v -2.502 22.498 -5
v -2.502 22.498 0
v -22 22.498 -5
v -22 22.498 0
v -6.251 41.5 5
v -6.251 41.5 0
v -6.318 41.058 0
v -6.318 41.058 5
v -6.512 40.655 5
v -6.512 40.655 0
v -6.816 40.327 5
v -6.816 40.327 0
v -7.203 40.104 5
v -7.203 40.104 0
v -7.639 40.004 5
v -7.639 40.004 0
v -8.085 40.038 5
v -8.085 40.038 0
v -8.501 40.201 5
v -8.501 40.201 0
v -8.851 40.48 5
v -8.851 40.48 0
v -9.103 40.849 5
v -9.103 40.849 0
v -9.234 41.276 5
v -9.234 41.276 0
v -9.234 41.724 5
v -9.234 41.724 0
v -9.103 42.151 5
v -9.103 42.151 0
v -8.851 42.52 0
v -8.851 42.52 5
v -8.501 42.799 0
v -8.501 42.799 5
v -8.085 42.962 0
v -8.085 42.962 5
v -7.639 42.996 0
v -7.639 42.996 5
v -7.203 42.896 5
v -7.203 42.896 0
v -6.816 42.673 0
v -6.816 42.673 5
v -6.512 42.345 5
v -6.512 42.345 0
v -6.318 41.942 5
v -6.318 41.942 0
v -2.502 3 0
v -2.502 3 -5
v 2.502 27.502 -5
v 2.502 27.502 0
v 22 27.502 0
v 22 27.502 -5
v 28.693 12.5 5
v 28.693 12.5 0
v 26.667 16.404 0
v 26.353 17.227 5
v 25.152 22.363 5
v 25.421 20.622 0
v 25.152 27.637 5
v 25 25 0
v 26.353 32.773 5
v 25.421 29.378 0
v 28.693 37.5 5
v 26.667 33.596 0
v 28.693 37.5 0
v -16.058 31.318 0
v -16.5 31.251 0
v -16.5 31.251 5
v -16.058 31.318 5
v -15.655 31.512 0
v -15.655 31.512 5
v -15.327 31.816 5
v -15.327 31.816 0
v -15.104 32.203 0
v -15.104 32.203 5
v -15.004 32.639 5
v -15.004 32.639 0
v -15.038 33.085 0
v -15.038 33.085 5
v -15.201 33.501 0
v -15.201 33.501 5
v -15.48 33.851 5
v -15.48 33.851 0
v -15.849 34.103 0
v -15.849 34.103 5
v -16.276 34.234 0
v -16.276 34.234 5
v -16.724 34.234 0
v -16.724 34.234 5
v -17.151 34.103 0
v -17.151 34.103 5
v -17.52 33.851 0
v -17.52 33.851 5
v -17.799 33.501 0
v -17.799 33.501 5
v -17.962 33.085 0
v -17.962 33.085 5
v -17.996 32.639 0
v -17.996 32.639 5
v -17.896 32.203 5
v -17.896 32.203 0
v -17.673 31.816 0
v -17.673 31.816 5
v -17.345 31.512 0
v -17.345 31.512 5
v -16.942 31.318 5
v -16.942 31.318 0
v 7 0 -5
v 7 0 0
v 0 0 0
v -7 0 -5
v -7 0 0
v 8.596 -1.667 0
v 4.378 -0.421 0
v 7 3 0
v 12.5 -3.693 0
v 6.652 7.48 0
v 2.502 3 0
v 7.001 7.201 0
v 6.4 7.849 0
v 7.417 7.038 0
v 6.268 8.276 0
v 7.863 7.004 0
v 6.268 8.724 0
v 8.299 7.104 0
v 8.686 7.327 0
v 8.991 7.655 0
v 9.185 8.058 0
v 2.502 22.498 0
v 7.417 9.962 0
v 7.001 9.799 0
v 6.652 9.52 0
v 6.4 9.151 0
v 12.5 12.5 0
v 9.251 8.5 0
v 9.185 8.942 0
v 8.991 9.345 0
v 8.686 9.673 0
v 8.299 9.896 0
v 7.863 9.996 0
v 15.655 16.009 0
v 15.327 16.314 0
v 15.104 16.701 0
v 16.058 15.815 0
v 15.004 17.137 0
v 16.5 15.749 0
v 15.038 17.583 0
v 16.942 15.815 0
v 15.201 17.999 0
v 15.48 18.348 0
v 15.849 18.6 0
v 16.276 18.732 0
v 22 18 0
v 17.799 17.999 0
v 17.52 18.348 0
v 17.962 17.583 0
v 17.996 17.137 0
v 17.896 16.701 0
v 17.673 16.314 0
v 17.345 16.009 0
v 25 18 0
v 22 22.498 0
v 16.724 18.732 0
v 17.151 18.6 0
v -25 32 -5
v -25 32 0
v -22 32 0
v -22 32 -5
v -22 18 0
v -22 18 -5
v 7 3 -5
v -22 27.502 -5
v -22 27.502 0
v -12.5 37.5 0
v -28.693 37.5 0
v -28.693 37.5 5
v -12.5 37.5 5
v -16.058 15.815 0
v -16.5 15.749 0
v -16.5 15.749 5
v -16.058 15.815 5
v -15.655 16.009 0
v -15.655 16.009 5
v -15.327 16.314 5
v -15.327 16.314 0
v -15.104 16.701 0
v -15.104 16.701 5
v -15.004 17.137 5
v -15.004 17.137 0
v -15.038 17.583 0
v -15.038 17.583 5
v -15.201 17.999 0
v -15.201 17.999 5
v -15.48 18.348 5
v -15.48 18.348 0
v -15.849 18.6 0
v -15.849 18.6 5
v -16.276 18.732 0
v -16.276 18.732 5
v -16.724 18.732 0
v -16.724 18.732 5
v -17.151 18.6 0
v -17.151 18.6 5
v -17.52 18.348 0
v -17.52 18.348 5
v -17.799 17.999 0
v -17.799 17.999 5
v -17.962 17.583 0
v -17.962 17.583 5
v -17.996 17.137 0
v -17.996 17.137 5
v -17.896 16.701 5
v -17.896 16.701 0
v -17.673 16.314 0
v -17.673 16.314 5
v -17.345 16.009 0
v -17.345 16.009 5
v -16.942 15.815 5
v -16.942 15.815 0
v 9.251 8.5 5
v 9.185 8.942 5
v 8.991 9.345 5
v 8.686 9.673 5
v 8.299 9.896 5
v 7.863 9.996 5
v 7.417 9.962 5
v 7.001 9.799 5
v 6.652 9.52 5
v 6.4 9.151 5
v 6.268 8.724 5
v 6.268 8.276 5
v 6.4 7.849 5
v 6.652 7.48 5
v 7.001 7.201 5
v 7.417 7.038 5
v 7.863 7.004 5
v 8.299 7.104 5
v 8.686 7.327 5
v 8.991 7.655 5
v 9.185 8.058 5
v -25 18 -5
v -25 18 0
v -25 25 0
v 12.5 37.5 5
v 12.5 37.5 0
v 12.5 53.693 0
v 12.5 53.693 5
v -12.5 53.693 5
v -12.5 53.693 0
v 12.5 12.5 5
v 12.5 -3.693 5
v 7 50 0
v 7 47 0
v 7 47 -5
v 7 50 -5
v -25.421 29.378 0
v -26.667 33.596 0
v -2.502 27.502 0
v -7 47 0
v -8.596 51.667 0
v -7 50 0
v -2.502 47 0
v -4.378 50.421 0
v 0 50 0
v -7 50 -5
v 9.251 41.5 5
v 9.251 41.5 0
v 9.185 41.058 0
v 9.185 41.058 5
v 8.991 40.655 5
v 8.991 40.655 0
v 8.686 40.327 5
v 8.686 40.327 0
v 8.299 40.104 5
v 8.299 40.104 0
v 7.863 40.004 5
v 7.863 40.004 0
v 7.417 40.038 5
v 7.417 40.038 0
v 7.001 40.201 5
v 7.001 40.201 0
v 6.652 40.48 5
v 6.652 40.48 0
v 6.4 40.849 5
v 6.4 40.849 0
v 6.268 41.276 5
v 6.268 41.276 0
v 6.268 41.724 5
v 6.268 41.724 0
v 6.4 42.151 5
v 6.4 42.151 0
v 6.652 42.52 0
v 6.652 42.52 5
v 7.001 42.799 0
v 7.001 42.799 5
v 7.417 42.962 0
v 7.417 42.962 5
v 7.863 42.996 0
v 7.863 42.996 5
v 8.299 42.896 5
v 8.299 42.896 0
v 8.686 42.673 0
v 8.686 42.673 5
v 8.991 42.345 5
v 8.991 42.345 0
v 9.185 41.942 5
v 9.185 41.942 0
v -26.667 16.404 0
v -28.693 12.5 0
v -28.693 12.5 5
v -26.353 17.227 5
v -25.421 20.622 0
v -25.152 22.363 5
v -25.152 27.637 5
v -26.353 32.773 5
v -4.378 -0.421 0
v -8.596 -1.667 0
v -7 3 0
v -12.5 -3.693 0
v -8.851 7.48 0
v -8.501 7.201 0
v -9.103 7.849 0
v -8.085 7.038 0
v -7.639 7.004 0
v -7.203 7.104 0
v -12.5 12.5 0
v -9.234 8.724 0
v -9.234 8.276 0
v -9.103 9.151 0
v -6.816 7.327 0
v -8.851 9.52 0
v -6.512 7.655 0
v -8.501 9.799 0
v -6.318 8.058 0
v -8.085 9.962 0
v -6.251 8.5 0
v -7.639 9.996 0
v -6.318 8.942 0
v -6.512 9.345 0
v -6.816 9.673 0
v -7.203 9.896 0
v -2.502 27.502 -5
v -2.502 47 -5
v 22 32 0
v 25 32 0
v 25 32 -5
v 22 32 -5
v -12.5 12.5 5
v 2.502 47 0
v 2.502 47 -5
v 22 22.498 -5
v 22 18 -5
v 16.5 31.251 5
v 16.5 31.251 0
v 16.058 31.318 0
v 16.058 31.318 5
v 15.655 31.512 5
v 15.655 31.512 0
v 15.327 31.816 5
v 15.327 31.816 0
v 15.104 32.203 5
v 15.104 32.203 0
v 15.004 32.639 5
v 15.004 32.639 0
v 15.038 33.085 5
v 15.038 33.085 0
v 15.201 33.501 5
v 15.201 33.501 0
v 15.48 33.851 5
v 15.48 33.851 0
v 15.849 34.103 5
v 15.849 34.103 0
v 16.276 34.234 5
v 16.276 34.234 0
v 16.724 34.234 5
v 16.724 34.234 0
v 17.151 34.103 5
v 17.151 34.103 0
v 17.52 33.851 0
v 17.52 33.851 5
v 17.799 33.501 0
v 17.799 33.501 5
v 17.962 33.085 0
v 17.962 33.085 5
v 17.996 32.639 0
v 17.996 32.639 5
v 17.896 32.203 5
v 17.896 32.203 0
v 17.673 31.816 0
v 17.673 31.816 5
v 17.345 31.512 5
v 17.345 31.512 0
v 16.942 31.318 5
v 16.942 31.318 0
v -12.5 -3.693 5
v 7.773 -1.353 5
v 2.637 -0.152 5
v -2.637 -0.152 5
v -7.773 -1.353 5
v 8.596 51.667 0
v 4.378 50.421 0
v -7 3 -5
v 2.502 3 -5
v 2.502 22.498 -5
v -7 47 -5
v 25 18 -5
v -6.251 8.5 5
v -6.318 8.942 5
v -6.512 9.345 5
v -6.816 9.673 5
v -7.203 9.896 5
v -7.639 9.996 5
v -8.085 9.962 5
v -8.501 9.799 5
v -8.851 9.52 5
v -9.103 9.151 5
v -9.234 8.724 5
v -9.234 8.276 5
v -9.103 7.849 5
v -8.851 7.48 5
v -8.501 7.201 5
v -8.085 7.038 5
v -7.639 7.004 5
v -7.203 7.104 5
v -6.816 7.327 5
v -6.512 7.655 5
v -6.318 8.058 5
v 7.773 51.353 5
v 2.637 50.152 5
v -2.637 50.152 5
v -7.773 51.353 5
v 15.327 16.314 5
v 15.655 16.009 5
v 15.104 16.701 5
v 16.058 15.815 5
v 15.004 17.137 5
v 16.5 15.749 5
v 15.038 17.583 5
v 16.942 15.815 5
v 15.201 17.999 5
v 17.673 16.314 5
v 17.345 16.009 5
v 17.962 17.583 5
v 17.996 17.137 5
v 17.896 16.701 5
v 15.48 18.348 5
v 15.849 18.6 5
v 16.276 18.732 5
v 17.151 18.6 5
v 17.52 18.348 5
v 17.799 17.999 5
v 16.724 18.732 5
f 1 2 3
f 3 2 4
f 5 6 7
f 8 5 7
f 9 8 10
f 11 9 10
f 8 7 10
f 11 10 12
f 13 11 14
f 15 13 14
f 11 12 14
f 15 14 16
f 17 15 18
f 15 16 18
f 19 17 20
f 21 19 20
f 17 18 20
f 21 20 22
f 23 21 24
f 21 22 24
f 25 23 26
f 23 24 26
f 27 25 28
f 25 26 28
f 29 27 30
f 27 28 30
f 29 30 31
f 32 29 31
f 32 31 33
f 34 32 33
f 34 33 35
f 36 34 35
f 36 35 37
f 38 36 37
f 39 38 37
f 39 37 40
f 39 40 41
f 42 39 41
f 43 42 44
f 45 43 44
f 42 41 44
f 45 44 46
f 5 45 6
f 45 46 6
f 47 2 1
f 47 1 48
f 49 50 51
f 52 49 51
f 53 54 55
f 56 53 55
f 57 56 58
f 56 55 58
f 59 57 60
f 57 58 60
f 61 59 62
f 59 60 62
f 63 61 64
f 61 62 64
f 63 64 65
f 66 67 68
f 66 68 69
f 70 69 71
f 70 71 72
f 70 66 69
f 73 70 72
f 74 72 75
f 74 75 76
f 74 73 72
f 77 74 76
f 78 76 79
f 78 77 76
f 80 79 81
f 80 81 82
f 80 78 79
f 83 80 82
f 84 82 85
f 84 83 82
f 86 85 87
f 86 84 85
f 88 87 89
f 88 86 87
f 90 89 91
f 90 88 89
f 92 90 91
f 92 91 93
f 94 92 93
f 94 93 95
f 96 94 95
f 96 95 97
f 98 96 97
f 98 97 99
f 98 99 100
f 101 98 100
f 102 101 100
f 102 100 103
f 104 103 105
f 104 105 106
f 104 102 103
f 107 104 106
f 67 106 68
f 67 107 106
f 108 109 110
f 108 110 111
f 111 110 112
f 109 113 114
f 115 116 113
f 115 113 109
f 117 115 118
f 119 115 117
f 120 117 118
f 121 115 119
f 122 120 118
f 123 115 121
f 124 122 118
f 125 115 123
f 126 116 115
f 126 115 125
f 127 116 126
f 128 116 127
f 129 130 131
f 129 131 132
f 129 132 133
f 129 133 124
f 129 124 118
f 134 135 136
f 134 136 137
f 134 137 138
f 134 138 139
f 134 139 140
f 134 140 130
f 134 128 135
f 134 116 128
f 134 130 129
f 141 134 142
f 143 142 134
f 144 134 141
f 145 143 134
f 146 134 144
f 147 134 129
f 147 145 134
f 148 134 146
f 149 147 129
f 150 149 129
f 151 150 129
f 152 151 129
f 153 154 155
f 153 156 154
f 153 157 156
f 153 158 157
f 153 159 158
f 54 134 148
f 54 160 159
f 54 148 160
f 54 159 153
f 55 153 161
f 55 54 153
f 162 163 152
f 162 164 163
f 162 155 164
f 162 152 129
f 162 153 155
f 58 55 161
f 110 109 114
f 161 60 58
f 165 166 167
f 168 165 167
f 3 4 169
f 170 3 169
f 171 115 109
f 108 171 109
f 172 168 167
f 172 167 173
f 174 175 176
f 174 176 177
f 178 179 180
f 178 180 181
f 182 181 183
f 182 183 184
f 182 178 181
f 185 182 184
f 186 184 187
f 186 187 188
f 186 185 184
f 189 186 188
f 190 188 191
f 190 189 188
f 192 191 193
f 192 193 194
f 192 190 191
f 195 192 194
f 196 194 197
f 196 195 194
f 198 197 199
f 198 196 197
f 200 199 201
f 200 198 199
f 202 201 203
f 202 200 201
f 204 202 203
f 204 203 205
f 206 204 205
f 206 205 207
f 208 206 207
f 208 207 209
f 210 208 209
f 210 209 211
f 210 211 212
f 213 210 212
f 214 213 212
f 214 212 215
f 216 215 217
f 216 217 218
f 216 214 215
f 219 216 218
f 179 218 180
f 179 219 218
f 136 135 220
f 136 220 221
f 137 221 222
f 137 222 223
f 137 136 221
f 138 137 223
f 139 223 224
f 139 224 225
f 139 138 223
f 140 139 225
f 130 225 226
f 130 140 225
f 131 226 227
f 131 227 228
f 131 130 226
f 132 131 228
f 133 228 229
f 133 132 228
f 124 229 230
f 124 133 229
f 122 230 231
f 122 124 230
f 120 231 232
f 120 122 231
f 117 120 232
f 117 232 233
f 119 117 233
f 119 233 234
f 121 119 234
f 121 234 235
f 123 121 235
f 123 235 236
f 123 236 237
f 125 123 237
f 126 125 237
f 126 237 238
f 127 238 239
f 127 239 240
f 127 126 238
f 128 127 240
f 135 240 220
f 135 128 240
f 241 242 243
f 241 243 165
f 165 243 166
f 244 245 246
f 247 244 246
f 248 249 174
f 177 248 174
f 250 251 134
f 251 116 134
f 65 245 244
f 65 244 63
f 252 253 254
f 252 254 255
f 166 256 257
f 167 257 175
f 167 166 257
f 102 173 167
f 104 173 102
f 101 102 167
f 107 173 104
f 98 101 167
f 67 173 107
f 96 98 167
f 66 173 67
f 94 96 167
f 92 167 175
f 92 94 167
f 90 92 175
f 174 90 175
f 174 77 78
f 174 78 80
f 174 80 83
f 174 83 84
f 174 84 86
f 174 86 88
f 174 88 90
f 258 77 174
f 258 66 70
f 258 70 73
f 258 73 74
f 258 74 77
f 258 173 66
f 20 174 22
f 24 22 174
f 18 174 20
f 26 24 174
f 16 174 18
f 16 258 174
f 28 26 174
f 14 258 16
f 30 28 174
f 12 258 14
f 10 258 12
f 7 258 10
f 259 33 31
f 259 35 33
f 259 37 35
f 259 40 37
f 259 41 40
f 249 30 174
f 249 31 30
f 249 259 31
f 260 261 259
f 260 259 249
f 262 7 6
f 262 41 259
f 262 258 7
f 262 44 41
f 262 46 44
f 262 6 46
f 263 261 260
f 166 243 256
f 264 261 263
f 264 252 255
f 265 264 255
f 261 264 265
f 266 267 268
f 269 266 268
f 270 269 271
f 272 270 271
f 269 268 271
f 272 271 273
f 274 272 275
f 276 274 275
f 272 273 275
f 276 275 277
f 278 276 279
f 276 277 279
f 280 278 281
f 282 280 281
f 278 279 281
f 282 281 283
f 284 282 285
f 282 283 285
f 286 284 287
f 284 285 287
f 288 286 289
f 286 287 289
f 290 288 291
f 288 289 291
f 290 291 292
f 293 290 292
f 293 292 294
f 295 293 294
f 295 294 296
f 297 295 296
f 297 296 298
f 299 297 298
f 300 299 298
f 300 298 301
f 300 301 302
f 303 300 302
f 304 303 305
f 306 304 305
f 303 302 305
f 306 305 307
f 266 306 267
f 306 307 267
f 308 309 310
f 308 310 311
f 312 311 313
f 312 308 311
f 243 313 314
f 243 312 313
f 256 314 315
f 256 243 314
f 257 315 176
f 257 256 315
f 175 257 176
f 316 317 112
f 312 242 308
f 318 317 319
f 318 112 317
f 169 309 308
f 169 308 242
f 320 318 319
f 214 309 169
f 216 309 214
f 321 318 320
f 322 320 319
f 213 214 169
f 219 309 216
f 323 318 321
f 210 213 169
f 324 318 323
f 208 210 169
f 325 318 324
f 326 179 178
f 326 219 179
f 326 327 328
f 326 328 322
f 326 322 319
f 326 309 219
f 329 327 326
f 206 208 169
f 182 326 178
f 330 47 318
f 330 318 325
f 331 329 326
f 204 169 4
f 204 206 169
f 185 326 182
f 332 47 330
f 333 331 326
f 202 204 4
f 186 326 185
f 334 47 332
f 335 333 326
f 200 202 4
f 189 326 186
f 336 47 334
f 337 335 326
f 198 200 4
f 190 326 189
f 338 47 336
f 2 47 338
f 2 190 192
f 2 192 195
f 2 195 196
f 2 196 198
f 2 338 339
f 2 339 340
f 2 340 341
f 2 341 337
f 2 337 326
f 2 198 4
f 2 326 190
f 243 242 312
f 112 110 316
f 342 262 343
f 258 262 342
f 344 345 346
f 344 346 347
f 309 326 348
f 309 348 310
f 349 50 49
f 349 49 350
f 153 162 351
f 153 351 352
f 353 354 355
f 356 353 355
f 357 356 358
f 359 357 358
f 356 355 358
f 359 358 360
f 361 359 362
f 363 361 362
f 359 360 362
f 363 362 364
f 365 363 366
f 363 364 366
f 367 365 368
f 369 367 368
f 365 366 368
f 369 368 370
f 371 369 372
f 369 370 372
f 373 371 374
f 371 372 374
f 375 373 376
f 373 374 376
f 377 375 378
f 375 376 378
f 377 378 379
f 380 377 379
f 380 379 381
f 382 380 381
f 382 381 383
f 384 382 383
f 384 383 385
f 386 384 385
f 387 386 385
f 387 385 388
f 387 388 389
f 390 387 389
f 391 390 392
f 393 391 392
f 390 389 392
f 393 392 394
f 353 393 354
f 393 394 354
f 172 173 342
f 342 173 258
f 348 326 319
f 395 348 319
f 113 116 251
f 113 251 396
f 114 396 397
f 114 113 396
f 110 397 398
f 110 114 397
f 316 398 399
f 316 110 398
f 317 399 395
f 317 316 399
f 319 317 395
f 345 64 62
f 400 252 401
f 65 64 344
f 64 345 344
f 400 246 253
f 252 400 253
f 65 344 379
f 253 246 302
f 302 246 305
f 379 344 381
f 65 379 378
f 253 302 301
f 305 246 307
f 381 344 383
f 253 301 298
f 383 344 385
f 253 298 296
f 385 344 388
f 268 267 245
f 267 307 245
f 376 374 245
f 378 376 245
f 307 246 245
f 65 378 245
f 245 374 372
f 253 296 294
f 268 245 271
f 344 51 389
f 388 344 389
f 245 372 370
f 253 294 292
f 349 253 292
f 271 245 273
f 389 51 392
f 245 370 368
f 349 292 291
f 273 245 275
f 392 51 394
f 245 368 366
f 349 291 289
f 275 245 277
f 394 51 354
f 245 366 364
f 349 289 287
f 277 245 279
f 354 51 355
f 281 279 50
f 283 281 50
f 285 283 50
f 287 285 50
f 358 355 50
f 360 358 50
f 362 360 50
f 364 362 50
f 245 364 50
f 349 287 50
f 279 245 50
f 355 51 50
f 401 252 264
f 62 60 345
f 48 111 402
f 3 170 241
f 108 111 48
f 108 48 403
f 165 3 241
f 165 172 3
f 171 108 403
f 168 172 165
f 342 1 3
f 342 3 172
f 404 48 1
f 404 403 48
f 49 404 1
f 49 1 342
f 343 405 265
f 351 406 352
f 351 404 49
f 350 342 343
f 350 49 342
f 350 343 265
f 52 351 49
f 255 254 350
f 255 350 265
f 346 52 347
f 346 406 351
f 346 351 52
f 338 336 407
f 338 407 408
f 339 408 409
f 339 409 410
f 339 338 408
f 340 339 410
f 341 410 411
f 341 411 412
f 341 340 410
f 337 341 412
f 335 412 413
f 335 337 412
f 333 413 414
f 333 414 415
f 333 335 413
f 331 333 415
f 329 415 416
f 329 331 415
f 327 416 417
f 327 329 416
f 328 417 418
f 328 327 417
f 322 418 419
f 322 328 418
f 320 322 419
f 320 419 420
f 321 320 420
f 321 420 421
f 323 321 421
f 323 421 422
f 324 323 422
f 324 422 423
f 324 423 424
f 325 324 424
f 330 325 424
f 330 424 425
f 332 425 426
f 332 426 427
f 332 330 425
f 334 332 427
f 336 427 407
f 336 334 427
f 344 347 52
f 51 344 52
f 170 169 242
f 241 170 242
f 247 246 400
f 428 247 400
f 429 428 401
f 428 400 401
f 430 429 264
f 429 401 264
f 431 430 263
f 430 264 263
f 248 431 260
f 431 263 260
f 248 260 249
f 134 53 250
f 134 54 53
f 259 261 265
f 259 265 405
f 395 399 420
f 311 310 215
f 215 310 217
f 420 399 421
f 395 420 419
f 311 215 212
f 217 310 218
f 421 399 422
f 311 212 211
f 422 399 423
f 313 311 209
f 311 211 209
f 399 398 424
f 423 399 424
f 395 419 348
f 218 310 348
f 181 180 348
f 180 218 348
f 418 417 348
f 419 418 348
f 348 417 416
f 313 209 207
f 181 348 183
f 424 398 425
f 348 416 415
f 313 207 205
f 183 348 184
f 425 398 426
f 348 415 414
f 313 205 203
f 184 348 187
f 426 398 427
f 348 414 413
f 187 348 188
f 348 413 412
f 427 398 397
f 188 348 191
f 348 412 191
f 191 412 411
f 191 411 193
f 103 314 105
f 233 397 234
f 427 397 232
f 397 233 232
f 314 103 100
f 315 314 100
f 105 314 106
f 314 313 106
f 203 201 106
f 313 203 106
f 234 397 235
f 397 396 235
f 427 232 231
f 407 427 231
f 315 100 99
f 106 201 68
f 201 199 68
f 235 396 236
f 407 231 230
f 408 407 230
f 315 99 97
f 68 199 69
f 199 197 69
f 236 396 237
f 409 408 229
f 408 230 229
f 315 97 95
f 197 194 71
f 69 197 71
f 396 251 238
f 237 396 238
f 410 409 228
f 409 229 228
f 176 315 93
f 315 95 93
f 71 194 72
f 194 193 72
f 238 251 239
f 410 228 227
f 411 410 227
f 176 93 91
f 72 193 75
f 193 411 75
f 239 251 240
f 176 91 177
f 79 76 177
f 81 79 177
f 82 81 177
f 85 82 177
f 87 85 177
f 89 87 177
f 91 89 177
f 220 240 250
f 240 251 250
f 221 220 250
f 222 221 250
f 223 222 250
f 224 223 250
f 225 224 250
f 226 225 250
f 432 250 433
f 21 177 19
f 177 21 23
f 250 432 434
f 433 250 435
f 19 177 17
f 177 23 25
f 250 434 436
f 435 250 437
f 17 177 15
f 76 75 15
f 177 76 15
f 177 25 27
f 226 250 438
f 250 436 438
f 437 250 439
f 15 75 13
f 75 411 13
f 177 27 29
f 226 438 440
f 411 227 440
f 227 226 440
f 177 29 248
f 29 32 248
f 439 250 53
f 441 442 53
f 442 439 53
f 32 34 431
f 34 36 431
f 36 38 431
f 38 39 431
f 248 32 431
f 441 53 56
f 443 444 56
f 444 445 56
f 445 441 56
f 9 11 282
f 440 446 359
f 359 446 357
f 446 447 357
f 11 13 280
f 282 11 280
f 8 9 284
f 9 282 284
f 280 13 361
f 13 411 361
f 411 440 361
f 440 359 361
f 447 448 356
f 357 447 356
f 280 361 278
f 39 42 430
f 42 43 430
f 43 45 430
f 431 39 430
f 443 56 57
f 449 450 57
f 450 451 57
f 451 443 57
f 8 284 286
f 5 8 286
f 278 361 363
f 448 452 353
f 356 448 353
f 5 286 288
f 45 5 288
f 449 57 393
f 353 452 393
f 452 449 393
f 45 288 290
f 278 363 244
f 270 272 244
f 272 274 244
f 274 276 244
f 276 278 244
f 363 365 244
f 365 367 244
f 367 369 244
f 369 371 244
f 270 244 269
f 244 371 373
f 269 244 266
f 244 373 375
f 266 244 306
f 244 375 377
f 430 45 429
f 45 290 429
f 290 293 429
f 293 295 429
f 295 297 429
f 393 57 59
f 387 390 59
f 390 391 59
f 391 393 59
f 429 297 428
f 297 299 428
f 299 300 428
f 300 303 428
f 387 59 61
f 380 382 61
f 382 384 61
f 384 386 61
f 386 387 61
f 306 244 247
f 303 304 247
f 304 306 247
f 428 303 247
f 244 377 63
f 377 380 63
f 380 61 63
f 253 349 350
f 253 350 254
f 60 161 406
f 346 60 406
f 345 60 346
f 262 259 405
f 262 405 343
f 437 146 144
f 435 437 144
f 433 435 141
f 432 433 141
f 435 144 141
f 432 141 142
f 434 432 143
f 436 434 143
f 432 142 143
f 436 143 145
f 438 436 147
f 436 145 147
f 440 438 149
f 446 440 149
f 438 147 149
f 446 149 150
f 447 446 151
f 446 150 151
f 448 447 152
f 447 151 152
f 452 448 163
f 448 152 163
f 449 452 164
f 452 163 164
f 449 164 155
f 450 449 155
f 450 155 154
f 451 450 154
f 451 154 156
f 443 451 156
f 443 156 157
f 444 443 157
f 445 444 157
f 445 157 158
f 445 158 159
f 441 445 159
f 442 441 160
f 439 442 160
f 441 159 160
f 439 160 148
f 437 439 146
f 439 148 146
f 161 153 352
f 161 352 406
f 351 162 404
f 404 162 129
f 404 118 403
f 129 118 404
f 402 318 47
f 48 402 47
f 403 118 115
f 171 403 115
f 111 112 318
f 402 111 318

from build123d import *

# Parameters (mm, degrees)
SKETCH2_R           = 1.5
BOSS_EXTRUDE1_DEPTH = 5
BOSS_EXTRUDE2_DEPTH = 5


with BuildPart() as part:
    # Sketch2 → Boss-Extrude1 (new body)
    with BuildSketch(Plane.XY):
        with BuildLine():
            Line((-12.5, -3.693265424), (-12.5, 25))
            Line((-12.5, 25), (12.5, 25))
            Line((12.5, 25), (12.5, -3.693265424))
            ThreePointArc((12.5, -3.693265424), (0, 0), (-12.5, -3.693265424))
        make_face()
        with Locations((-7.751243347, 8.5)):
            Circle(SKETCH2_R, mode=Mode.SUBTRACT)
        with Locations((7.751243347, 8.5)):
            Circle(SKETCH2_R, mode=Mode.SUBTRACT)
    extrude(amount=BOSS_EXTRUDE1_DEPTH)

    # Sketch3 → Boss-Extrude2 (add)
    with BuildSketch(Plane(origin=(0, 0, 0), x_dir=(-1, 0, 0), z_dir=(0, 0, -1))):
        Polygon((2.502486694, 11.5), (2.502486694, 25), (-2.502486694, 25), (-2.502486694, 11.5), (-2.502486694, 3.5), (-2.502486694, 3), (-7, 3), (-7, 0.5), (-7, 0), (7, 0), (7, 0.5), (7, 3), (2.502486694, 3), (2.502486694, 3.5), align=None)
    extrude(amount=BOSS_EXTRUDE2_DEPTH)

    # Mirror1: part across plane


with BuildPart() as part_1:
    add(part.part)
    add(part.part.mirror(Plane(origin=(-12.5, 25, 5), x_dir=(0, 0, 1), z_dir=(0, -1, 0))))

    # Mirror2: part across plane


with BuildPart() as part_2:
    add(part_1.part)
    add(part_1.part.mirror(Plane(origin=(12.5, 12.5, 0), x_dir=(0, 0, 1), z_dir=(0.7071067811865488, 0.7071067811865464, 0))))


solid = part_2.part
